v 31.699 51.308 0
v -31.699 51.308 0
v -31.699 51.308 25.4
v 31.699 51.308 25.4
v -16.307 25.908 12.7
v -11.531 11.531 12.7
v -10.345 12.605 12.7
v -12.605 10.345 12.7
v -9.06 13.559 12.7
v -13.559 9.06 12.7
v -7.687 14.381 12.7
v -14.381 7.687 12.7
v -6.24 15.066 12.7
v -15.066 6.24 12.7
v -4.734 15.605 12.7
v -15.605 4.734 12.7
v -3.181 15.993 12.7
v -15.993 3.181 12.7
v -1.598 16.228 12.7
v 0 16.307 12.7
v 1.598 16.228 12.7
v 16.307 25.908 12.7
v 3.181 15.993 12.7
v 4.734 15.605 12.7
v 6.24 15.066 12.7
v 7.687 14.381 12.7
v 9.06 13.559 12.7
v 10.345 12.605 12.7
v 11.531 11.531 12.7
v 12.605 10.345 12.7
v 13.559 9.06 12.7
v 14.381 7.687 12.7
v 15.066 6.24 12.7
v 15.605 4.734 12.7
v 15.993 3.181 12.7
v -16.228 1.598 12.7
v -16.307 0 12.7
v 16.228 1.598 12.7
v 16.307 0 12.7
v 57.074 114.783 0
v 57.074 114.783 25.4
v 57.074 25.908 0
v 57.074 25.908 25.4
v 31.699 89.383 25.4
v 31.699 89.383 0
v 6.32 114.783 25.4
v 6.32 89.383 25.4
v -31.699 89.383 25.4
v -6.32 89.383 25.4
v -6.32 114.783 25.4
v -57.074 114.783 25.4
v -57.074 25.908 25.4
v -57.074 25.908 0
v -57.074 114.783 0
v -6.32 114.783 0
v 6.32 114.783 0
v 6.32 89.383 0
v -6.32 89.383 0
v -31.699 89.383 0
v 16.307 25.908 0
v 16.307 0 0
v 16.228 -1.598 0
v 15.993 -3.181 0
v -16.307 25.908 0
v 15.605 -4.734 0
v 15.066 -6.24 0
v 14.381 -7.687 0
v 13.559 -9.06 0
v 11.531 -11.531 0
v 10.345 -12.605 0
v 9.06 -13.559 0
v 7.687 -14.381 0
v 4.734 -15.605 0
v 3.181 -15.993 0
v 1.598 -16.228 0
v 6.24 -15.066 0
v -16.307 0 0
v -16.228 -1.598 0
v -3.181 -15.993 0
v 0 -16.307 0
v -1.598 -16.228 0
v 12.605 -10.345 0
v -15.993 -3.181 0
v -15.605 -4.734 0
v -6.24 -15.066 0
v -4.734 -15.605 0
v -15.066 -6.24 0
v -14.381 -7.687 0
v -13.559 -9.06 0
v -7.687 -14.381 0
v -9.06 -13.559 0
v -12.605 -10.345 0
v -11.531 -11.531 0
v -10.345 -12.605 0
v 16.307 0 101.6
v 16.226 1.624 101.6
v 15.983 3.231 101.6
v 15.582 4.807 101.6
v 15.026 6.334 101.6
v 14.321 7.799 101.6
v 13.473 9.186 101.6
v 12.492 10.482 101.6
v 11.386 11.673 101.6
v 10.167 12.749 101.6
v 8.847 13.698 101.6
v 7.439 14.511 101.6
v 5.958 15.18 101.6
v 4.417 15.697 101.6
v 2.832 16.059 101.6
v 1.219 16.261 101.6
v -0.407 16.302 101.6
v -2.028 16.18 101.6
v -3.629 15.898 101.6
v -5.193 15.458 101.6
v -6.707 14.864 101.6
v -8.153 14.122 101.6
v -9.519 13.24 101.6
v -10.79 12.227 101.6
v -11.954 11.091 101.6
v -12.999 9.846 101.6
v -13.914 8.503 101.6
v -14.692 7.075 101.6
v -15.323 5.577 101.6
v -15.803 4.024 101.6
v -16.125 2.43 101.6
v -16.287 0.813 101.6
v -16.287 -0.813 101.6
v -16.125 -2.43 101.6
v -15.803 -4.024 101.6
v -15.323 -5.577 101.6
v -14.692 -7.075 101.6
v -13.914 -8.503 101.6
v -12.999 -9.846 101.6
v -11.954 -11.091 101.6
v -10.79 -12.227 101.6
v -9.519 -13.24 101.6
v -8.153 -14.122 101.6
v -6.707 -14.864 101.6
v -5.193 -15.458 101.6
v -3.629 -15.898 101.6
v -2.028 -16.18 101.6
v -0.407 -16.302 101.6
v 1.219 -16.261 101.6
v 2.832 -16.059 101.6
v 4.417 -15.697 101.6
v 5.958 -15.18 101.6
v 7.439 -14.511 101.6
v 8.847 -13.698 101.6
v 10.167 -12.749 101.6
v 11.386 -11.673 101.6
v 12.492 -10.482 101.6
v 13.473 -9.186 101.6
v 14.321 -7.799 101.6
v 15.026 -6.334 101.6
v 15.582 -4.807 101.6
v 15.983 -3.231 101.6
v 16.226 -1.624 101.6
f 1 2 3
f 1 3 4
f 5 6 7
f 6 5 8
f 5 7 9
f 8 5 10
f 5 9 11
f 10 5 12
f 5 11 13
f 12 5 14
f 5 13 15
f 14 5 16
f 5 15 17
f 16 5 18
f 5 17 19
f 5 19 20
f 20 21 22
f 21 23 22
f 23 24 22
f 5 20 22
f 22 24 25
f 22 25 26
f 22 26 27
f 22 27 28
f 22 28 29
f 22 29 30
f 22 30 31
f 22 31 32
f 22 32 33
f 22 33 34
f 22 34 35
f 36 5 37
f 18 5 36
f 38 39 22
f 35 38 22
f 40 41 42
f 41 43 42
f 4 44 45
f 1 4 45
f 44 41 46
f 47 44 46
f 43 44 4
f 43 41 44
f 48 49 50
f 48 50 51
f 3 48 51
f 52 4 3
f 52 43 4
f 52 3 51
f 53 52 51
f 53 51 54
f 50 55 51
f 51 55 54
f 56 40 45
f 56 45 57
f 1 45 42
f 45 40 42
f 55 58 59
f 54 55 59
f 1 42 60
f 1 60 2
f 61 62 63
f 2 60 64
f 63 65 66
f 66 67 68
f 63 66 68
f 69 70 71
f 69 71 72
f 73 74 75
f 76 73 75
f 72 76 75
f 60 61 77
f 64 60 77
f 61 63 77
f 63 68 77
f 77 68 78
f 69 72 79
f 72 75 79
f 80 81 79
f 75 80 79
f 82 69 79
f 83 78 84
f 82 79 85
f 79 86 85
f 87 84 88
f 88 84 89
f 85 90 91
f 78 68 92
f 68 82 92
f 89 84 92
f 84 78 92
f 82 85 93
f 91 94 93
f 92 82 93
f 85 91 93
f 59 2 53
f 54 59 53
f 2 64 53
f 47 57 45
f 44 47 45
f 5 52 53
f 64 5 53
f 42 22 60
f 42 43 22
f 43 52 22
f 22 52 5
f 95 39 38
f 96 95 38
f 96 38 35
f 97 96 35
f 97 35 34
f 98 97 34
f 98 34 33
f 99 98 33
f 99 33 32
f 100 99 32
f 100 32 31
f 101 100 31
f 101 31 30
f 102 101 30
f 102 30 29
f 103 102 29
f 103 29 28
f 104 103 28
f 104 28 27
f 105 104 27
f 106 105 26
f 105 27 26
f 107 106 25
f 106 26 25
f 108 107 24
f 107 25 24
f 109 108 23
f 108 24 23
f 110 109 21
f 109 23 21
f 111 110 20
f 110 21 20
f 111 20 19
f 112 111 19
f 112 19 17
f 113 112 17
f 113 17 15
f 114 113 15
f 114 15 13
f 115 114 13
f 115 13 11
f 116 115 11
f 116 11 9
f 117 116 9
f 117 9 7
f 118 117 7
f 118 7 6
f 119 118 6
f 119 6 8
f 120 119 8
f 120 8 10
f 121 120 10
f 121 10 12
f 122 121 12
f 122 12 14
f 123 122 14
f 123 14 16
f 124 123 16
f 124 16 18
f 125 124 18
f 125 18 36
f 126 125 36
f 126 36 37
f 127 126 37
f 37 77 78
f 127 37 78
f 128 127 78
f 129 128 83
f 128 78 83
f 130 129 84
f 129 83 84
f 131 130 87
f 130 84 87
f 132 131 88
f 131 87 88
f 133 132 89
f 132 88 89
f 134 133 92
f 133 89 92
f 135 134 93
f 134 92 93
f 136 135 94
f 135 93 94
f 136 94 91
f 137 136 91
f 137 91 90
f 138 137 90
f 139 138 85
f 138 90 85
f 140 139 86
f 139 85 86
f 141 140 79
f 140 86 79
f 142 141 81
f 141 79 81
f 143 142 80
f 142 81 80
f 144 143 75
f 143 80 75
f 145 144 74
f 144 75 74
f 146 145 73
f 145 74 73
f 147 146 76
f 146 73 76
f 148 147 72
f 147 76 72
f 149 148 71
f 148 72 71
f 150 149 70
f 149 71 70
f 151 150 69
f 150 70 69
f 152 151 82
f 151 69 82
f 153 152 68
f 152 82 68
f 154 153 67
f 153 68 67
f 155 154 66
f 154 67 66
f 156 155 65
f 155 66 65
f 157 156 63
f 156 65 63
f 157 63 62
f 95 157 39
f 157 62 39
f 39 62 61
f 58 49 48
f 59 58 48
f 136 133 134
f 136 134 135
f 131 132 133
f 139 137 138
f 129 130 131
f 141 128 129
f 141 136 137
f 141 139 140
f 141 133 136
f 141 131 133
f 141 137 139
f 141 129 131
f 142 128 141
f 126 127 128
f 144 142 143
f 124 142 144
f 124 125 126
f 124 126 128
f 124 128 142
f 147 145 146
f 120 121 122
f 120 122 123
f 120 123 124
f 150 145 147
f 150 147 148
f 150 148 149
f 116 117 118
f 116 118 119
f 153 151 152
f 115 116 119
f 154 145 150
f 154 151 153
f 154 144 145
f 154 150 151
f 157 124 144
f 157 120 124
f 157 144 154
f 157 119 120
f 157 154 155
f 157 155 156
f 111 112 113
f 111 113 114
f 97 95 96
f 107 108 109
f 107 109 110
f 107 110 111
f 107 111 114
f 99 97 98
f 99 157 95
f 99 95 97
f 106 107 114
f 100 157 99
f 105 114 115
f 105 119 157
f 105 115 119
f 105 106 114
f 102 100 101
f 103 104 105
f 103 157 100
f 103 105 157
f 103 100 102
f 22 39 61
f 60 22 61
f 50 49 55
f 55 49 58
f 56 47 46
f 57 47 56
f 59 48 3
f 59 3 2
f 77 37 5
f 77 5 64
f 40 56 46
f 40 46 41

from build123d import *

# Parameters (mm, degrees)
SKETCH1_R       = 16.3068
FEATURE_A_DEPTH = 101.6
SKETCH2_W       = 32.6136
SKETCH2_H       = 12.7
FEATURE_B_DEPTH = 25.908
SKETCH3_W       = 63.3984
SKETCH3_H       = 25.4
FEATURE_C_DEPTH = 25.4
SKETCH4_W       = 25.4
SKETCH4_H       = 63.4746
FEATURE_D_DEPTH = 25.3746
SKETCH5_W       = 50.75428
SKETCH5_H       = 25.4
FEATURE_E_DEPTH = 25.4


with BuildPart() as part:
    # Sketch1 → Feature A (new body)
    with BuildSketch(Plane.XY):
        Circle(SKETCH1_R)
    extrude(amount=FEATURE_A_DEPTH)

    # Sketch2 → Feature B (add)
    with BuildSketch(Plane(origin=(0, 0, 0), x_dir=(1, 0, 0), z_dir=(0, 1, 0))):
        with Locations((0, -6.35)):
            Rectangle(SKETCH2_W, SKETCH2_H)
    extrude(amount=FEATURE_B_DEPTH)

    # Sketch3 → Feature C (add)
    with BuildSketch(Plane(origin=(0, 25.908, 0), x_dir=(1, 0, 0), z_dir=(0, 1, 0))):
        with Locations((0, -12.7)):
            Rectangle(SKETCH3_W, SKETCH3_H)
    feature_c = extrude(amount=FEATURE_C_DEPTH)

    # Sketch4 → Feature D (add)
    with BuildSketch(Plane(origin=(31.6992, 0, 0), x_dir=(0, 0, -1), z_dir=(1, 0, 0))):
        with Locations((-12.7, 57.6453)):
            Rectangle(SKETCH4_W, SKETCH4_H)
    feature_d = extrude(amount=FEATURE_D_DEPTH)

    # Sketch5 → Feature E (add)
    with BuildSketch(Plane(origin=(0, 89.3826, 0), x_dir=(1, 0, 0), z_dir=(0, 1, 0))):
        with Locations((31.69666, -12.7)):
            Rectangle(SKETCH5_W, SKETCH5_H)
    feature_e = extrude(amount=FEATURE_E_DEPTH)

    # Mirror6: Feature C, Feature D, Feature E across plane
    add(feature_c.mirror(Plane.ZY))
    add(feature_d.mirror(Plane.ZY))
    add(feature_e.mirror(Plane.ZY))


solid = part.part
